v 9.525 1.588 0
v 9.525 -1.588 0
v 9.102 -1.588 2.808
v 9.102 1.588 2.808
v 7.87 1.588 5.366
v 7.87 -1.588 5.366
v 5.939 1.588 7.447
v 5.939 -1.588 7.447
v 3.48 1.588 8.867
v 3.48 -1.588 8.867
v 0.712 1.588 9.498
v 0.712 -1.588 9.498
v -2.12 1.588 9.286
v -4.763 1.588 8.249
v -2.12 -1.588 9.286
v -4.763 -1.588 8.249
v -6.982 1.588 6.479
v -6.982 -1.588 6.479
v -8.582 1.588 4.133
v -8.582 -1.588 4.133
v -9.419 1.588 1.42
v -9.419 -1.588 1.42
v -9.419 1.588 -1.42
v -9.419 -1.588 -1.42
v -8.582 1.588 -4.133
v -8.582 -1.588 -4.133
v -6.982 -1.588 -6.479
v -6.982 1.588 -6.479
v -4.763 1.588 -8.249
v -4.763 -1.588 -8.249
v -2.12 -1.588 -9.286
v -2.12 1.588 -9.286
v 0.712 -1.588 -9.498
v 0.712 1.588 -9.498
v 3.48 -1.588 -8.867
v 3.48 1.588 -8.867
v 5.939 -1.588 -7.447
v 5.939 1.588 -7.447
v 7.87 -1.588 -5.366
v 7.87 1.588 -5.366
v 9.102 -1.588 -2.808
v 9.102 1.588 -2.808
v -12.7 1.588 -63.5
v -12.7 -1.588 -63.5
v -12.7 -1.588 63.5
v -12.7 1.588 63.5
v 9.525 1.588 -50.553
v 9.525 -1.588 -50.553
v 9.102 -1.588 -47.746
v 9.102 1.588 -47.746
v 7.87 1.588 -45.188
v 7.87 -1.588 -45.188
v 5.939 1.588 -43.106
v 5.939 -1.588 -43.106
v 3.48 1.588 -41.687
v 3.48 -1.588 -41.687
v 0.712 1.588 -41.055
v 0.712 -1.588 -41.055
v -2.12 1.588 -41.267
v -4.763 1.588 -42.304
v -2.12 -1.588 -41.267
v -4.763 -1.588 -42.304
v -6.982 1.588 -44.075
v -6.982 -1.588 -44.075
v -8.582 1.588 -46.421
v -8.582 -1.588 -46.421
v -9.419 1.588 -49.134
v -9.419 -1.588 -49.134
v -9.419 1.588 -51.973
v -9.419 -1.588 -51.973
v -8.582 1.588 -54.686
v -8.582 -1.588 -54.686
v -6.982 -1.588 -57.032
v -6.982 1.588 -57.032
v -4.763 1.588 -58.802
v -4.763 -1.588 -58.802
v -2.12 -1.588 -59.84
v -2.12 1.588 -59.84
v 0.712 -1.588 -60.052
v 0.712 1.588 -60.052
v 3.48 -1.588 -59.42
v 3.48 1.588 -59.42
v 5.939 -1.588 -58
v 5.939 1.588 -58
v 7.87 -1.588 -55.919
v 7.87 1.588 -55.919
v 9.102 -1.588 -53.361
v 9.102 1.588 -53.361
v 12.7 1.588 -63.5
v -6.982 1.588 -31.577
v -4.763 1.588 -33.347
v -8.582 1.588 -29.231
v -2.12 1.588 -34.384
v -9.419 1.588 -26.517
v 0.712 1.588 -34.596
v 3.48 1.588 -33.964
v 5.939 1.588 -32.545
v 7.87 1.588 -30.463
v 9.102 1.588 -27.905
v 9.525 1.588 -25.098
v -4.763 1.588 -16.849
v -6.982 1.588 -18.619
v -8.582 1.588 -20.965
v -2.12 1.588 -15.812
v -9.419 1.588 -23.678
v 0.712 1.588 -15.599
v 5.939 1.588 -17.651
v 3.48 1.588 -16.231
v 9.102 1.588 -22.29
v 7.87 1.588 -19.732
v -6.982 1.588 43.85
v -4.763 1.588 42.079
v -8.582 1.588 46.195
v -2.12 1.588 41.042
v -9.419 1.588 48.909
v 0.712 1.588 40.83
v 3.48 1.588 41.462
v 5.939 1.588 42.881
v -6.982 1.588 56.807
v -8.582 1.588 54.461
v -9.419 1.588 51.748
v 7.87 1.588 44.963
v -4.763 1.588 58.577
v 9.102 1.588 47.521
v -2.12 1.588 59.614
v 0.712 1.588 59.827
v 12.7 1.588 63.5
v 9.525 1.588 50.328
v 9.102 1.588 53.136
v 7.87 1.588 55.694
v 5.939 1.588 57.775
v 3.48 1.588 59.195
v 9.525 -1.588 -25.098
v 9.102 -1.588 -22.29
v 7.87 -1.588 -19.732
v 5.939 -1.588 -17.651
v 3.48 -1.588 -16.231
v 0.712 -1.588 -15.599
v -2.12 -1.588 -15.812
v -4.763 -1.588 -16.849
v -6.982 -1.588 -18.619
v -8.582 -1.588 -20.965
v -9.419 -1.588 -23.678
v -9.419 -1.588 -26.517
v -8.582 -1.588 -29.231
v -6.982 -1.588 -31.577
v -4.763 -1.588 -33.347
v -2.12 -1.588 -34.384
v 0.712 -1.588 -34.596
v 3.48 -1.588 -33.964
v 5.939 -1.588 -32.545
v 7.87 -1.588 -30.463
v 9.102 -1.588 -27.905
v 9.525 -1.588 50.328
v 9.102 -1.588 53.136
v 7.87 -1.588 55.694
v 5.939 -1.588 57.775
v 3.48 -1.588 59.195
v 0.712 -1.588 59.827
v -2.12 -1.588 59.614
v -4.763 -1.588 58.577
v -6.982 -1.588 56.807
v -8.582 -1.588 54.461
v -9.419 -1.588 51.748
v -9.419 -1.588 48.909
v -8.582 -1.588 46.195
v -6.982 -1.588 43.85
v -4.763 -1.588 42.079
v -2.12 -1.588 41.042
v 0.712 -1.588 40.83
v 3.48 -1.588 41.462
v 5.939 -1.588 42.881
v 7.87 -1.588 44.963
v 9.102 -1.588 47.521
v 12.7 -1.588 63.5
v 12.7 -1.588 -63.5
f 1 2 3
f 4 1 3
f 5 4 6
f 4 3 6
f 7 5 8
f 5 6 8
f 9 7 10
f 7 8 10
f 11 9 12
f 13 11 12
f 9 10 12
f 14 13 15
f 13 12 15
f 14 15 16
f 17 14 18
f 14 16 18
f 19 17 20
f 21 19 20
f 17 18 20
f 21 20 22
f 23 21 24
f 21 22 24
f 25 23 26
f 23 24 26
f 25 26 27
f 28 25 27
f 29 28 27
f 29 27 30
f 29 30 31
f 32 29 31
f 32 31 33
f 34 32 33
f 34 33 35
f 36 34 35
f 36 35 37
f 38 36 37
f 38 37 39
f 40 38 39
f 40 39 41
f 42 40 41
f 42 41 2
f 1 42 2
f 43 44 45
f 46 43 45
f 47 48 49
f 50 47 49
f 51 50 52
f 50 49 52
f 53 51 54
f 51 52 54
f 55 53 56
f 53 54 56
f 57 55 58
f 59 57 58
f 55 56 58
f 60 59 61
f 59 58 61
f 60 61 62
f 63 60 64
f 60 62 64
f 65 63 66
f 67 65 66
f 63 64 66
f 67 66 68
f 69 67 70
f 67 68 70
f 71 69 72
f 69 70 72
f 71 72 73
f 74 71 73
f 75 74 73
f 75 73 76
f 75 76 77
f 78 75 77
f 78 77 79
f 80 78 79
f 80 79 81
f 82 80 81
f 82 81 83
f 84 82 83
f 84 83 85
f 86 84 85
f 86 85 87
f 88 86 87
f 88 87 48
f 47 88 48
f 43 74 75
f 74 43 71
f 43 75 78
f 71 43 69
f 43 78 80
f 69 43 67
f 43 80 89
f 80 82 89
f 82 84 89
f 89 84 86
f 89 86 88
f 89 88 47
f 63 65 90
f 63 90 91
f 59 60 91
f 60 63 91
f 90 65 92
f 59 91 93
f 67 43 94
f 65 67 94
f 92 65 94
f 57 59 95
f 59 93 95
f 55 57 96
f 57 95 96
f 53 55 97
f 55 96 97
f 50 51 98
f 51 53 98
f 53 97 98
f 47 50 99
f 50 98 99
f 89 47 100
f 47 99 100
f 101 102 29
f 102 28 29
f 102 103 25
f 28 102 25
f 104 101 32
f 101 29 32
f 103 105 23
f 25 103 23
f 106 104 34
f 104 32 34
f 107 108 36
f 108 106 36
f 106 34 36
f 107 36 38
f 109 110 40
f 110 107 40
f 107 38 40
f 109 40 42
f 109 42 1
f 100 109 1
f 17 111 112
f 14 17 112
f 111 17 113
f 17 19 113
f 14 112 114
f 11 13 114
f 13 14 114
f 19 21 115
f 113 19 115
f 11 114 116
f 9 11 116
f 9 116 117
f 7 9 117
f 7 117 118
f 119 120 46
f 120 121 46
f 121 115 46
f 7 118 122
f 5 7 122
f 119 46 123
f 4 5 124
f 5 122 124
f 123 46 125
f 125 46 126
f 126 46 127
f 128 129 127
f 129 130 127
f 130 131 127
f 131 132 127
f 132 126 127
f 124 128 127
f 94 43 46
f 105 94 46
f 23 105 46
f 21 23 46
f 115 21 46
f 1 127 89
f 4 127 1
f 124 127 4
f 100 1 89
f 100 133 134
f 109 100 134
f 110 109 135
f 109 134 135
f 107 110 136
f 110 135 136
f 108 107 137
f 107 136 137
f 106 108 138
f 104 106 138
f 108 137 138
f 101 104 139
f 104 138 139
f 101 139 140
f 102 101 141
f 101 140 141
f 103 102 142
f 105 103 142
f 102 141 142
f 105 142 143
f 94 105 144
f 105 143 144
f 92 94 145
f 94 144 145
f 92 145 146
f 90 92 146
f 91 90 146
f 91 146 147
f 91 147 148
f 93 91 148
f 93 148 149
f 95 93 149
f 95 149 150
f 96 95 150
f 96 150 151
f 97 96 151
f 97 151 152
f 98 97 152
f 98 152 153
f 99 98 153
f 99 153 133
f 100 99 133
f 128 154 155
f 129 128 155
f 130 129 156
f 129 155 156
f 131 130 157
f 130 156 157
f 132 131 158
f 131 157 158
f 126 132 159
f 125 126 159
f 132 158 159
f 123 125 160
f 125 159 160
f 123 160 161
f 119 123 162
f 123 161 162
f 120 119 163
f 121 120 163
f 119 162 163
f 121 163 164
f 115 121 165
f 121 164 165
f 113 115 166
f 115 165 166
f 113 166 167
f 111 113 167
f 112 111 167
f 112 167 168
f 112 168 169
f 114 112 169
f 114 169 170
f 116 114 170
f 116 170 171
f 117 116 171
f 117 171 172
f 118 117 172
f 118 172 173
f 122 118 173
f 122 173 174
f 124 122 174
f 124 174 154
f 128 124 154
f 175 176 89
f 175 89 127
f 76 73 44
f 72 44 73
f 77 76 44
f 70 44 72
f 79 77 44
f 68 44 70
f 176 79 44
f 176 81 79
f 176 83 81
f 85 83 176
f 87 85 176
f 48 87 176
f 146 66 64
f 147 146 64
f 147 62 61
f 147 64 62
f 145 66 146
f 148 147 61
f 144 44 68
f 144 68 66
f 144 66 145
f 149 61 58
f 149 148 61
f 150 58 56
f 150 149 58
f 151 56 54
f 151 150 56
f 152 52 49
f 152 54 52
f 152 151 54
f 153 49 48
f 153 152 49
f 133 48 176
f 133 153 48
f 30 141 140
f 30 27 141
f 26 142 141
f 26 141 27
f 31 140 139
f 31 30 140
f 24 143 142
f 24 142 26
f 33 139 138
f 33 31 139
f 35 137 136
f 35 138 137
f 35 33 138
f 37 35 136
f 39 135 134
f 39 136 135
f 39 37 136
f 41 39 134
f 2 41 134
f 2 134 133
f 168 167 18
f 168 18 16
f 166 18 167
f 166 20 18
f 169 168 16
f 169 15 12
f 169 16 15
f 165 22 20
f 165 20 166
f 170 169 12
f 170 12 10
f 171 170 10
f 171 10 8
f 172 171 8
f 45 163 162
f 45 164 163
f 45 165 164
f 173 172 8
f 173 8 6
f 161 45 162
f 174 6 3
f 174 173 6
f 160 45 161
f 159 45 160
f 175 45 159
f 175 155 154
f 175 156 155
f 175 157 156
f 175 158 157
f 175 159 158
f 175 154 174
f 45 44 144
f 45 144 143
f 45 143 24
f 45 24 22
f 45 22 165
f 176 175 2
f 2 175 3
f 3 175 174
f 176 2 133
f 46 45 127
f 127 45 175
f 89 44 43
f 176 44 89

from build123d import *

# Parameters (mm, degrees)
F0_W     = 25.4
F0_H     = 127
F1_DEPTH = 1.5875
F2_R     = 9.525
F3_DEPTH = 25.4
F4_R     = 9.525
F5_DEPTH = 25.4
F6_R     = 9.525
F7_DEPTH = 25.4
F8_R     = 9.525
F9_DEPTH = 25.4


with BuildPart() as f1:
    # F0 (on Front) → F1 (new body, symmetric)
    with BuildSketch(Plane.XZ):
        Rectangle(F0_W, F0_H)
    extrude(amount=F1_DEPTH, both=True)

    # F2 (on face) → F3 (cut)
    with BuildSketch(Plane.XZ.offset(1.5875)):
        with Locations((0, 50.328158)):
            Circle(F2_R)
    extrude(amount=-F3_DEPTH, mode=Mode.SUBTRACT)

    # F4 (on face) → F5 (cut)
    with BuildSketch(Plane.XZ.offset(1.5875)):
        with Locations((0, -50.553336)):
            Circle(F4_R)
    extrude(amount=-F5_DEPTH, mode=Mode.SUBTRACT)

    # F6 (on face) → F7 (cut)
    with BuildSketch(Plane.XZ.offset(1.5875)):
        Circle(F6_R)
    extrude(amount=-F7_DEPTH, mode=Mode.SUBTRACT)

    # F8 (on face) → F9 (cut)
    with BuildSketch(Plane.XZ.offset(1.5875)):
        with Locations((0, -25.097863)):
            Circle(F8_R)
    extrude(amount=-F9_DEPTH, mode=Mode.SUBTRACT)


solid = f1.part
